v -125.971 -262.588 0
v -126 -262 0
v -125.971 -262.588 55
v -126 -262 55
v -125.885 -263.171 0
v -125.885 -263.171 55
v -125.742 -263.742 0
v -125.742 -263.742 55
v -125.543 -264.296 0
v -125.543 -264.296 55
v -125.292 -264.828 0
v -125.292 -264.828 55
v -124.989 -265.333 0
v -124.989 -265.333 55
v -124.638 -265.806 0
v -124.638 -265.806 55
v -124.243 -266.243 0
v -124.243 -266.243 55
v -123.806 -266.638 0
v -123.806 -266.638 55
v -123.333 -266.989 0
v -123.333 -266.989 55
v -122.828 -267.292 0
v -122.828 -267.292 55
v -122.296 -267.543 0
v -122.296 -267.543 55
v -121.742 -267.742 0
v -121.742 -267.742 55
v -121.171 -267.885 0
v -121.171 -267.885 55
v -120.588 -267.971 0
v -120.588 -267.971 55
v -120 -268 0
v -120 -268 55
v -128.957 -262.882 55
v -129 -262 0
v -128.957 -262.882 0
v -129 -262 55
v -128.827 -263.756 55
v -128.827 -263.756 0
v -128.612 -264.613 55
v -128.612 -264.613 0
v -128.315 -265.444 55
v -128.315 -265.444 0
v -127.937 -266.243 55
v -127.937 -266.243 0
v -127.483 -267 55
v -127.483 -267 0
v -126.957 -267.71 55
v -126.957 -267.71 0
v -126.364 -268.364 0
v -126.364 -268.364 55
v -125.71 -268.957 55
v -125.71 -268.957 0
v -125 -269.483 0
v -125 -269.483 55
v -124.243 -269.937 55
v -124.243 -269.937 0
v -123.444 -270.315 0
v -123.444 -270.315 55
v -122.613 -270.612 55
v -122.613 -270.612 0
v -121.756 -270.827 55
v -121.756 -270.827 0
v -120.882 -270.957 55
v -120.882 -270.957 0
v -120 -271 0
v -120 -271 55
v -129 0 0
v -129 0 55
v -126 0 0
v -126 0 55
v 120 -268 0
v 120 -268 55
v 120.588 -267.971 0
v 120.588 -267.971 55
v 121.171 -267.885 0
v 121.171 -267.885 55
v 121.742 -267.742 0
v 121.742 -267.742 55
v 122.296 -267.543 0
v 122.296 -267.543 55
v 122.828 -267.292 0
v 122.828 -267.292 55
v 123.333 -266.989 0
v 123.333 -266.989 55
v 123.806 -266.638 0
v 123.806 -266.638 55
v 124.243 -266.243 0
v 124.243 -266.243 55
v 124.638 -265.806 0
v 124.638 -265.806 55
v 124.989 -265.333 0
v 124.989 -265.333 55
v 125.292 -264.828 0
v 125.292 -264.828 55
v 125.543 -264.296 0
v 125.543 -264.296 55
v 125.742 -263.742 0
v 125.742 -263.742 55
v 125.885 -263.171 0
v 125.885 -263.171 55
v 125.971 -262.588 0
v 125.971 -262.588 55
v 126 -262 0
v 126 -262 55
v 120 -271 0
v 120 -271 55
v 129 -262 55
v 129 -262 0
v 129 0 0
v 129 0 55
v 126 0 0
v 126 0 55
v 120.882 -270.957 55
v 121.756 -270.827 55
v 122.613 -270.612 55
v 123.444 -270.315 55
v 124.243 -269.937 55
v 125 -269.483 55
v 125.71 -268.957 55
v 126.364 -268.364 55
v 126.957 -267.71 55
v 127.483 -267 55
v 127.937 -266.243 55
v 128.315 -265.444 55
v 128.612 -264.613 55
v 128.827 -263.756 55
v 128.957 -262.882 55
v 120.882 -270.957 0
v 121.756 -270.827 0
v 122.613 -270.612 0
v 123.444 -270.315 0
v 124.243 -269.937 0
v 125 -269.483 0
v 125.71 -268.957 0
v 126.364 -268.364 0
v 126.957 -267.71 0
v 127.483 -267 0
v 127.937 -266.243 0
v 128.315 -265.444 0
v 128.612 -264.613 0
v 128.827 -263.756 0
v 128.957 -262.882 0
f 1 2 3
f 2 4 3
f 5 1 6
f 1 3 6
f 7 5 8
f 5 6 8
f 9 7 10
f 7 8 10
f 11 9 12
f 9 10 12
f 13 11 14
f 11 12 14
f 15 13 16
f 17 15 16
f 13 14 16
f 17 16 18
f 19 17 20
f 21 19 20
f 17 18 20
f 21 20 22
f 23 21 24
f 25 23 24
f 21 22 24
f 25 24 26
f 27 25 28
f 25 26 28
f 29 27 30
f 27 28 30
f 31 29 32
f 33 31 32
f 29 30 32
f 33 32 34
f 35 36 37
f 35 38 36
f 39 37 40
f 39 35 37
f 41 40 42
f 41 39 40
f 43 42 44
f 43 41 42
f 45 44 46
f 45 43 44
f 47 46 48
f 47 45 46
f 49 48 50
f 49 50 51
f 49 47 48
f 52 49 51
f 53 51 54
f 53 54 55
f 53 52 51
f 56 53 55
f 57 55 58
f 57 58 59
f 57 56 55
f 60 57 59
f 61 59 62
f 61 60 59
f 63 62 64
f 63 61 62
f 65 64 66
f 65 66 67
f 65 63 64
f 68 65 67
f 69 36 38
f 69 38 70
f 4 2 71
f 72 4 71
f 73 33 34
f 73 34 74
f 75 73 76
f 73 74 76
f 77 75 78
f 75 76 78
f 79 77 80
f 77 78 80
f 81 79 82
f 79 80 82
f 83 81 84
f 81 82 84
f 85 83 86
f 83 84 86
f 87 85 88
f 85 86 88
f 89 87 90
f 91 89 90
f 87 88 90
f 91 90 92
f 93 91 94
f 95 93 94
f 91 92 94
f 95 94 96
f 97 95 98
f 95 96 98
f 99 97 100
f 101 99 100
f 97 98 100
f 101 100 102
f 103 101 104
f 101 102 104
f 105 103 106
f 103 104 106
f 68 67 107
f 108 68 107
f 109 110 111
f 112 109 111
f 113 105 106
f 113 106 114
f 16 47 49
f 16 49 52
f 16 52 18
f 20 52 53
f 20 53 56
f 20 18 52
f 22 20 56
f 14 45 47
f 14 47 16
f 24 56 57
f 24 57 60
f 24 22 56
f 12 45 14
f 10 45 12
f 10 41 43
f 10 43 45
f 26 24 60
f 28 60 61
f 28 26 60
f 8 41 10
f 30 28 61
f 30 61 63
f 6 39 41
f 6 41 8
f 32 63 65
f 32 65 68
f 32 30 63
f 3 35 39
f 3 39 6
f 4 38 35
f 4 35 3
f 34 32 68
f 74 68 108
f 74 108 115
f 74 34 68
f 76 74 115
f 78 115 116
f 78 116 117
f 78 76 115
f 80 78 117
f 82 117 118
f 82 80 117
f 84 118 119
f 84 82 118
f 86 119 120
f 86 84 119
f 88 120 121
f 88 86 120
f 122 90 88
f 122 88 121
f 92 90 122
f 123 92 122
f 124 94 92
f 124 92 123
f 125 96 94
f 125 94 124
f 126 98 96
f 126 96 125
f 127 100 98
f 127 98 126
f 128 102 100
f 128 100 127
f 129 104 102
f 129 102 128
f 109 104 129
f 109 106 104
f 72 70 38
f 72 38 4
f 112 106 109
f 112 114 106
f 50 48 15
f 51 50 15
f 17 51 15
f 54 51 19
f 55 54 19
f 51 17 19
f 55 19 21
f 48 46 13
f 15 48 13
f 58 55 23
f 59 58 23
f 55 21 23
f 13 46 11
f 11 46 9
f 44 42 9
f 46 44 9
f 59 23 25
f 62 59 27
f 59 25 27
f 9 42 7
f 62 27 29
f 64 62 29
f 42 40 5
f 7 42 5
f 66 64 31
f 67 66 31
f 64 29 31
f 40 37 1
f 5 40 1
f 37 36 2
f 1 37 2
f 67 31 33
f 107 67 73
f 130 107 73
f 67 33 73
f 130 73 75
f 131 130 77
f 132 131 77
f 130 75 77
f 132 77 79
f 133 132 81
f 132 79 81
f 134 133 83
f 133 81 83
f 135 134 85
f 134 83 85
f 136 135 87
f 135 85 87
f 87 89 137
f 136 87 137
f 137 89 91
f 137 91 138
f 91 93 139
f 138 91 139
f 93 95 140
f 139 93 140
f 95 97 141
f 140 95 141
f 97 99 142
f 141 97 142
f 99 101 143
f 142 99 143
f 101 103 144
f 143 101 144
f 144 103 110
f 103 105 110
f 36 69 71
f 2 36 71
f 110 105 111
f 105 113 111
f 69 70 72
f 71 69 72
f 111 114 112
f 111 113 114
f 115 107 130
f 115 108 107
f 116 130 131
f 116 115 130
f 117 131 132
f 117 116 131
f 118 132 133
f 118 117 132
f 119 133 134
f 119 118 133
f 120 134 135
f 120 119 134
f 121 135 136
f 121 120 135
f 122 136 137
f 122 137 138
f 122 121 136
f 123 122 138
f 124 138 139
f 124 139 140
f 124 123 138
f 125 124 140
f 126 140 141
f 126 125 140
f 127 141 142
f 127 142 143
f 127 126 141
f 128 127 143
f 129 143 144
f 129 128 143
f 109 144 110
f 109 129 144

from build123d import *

# Parameters (mm, degrees)
SKETCH040_W    = 252
SKETCH040_H    = 268
PAD011_DEPTH   = 55
FILLET013_R    = 6
THICKNESS001_T = 3


with BuildPart() as part:
    # Sketch040 → Pad011 (new body)
    with BuildSketch(Plane.XY):
        with Locations((0, -134)):
            Rectangle(SKETCH040_W, SKETCH040_H)
    extrude(amount=PAD011_DEPTH)

    # Fillet013
    fillet013_edges = [part.edges().sort_by_distance(p)[0] for p in [
        (126, -268, 27.5),
        (-126, -268, 27.5),
    ]]
    fillet(fillet013_edges, radius=FILLET013_R)

    # Thickness001
    thickness001_openings = [part.faces().sort_by_distance(p)[0] for p in [
        (0, -133.969642, 55),
        (0, -133.969642, 0),
        (0, 0, 27.5),
    ]]
    offset(amount=THICKNESS001_T, openings=thickness001_openings)


solid = part.part
